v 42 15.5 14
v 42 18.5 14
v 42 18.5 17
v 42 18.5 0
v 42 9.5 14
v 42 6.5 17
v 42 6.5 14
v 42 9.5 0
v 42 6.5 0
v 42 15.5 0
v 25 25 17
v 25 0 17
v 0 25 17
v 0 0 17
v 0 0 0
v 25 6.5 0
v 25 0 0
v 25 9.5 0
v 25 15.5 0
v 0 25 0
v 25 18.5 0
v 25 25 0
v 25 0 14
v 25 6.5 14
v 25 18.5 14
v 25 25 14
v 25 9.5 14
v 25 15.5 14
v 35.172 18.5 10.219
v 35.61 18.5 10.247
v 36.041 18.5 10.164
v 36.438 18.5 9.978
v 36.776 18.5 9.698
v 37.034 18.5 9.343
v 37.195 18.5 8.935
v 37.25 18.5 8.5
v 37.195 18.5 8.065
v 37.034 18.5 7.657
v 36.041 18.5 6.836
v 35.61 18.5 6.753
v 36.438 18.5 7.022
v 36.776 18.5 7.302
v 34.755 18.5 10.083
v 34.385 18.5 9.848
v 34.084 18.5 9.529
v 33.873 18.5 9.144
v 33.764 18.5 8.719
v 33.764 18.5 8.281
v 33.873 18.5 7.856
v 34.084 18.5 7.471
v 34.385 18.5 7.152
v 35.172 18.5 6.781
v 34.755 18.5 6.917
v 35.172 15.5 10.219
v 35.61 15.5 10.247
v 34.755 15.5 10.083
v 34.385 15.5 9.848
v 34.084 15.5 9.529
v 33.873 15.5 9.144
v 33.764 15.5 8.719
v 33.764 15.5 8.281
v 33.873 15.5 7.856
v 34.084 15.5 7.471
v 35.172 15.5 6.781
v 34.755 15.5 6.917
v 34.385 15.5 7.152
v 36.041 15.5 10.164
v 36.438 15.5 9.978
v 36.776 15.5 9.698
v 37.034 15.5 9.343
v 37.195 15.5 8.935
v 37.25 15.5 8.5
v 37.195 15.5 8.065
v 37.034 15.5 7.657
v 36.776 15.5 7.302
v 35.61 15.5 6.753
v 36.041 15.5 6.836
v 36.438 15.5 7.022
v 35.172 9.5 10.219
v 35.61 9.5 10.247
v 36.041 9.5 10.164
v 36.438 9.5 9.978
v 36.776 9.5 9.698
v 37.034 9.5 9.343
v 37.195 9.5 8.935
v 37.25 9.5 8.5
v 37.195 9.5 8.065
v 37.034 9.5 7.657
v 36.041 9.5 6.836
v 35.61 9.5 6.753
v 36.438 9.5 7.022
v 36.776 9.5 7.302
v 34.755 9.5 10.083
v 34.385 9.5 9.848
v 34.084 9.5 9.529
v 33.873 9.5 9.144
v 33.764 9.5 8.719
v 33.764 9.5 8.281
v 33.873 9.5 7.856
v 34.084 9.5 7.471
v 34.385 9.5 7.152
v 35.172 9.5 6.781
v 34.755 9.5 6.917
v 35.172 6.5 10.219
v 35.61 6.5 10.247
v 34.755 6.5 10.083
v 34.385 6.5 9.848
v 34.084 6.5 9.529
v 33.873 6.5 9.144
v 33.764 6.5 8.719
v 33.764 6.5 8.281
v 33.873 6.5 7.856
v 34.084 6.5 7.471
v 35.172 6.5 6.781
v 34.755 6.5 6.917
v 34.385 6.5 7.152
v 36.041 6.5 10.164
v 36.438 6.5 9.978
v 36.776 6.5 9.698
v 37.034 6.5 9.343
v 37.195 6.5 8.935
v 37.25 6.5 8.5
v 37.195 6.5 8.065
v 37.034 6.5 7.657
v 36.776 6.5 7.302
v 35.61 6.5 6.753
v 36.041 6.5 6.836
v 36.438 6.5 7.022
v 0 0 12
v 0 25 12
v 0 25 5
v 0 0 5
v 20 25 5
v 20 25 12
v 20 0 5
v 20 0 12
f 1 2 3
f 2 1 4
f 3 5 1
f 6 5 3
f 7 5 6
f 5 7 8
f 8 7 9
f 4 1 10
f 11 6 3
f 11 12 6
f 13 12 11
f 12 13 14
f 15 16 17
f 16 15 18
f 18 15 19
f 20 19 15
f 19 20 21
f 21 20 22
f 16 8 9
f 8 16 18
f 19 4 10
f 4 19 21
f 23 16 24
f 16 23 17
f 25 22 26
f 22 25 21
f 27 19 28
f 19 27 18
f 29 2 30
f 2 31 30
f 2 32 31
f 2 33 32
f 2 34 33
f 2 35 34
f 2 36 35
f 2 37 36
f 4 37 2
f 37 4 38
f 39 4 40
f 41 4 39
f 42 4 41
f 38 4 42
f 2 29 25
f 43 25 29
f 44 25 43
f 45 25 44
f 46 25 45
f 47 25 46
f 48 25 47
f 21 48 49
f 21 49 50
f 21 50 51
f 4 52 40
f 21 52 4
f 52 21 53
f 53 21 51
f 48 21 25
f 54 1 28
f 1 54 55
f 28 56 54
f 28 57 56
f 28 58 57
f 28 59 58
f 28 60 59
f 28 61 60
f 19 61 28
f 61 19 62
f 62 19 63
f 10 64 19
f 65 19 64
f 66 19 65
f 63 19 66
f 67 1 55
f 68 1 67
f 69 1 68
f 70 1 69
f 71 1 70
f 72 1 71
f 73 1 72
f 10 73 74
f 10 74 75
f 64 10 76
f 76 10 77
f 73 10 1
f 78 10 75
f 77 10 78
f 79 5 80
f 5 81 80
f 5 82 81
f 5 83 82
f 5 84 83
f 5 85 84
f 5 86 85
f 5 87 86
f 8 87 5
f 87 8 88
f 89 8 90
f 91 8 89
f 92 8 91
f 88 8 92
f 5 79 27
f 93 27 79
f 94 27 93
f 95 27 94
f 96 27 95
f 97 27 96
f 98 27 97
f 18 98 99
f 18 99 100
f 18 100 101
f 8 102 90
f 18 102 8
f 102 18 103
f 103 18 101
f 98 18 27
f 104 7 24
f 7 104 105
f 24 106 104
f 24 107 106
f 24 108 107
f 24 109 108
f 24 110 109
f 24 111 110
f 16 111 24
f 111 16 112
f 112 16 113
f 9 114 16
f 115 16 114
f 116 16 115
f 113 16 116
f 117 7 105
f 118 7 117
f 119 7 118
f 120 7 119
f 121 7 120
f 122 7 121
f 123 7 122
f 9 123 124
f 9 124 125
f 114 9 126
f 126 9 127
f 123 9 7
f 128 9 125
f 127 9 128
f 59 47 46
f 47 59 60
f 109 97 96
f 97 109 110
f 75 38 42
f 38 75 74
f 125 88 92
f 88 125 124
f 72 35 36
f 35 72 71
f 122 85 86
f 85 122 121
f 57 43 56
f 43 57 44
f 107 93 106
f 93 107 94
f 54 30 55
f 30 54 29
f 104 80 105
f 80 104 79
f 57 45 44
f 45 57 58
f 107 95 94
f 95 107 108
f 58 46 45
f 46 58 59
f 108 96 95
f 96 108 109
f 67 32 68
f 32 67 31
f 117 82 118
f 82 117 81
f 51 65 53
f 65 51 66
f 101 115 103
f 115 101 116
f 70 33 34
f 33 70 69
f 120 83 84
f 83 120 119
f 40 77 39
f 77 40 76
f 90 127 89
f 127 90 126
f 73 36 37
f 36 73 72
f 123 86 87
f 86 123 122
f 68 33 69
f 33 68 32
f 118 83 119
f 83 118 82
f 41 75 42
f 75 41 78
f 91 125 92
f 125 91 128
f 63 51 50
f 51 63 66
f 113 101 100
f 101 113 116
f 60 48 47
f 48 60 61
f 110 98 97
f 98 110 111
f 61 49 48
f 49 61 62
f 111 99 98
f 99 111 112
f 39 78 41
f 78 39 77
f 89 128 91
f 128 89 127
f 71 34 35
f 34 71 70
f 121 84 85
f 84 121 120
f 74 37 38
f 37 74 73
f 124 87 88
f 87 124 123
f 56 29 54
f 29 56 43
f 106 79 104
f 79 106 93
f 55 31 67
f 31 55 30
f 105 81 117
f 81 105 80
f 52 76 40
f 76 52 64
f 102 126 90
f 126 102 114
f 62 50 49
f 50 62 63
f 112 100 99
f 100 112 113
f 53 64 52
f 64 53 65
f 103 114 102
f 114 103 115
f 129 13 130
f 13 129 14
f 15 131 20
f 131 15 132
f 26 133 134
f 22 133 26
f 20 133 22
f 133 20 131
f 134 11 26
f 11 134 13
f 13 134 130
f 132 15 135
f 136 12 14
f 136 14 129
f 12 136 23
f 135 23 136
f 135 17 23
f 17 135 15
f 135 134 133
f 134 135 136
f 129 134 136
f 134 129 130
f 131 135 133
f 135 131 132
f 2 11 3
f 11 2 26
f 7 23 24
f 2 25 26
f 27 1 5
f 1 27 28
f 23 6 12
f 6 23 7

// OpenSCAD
// i3 top mount bracket for Airtripper bowden extruder 
// Mark Benson 2015 CCNC

rotate([0,0,0])
union()
{

	difference()
	{

	//tab
    union(){
	translate([25,25/2+3,0]) #cube([17,3,17]);
    translate([25,25/2-3-3,0]) #cube([17,3,17]);
    }
	
	//Hole in tab
	rotate([90,0,0]) translate([25+10.5,(5+(7/2)),-20])  #cylinder(r=(3.5/2), h=20, $fn=25);
	
	}

	//plate mount
	difference()
	{
		cube([25,25,17]);
		translate([0,0,5]) #cube([20,25,7]);
	}

	//strengthening rib
	translate([25,0,14]) linear_extrude(height = 3) polygon(points=[[0,0],[17,25/2-3-3],[17,25/2+3+3],[0,25]]);
}
